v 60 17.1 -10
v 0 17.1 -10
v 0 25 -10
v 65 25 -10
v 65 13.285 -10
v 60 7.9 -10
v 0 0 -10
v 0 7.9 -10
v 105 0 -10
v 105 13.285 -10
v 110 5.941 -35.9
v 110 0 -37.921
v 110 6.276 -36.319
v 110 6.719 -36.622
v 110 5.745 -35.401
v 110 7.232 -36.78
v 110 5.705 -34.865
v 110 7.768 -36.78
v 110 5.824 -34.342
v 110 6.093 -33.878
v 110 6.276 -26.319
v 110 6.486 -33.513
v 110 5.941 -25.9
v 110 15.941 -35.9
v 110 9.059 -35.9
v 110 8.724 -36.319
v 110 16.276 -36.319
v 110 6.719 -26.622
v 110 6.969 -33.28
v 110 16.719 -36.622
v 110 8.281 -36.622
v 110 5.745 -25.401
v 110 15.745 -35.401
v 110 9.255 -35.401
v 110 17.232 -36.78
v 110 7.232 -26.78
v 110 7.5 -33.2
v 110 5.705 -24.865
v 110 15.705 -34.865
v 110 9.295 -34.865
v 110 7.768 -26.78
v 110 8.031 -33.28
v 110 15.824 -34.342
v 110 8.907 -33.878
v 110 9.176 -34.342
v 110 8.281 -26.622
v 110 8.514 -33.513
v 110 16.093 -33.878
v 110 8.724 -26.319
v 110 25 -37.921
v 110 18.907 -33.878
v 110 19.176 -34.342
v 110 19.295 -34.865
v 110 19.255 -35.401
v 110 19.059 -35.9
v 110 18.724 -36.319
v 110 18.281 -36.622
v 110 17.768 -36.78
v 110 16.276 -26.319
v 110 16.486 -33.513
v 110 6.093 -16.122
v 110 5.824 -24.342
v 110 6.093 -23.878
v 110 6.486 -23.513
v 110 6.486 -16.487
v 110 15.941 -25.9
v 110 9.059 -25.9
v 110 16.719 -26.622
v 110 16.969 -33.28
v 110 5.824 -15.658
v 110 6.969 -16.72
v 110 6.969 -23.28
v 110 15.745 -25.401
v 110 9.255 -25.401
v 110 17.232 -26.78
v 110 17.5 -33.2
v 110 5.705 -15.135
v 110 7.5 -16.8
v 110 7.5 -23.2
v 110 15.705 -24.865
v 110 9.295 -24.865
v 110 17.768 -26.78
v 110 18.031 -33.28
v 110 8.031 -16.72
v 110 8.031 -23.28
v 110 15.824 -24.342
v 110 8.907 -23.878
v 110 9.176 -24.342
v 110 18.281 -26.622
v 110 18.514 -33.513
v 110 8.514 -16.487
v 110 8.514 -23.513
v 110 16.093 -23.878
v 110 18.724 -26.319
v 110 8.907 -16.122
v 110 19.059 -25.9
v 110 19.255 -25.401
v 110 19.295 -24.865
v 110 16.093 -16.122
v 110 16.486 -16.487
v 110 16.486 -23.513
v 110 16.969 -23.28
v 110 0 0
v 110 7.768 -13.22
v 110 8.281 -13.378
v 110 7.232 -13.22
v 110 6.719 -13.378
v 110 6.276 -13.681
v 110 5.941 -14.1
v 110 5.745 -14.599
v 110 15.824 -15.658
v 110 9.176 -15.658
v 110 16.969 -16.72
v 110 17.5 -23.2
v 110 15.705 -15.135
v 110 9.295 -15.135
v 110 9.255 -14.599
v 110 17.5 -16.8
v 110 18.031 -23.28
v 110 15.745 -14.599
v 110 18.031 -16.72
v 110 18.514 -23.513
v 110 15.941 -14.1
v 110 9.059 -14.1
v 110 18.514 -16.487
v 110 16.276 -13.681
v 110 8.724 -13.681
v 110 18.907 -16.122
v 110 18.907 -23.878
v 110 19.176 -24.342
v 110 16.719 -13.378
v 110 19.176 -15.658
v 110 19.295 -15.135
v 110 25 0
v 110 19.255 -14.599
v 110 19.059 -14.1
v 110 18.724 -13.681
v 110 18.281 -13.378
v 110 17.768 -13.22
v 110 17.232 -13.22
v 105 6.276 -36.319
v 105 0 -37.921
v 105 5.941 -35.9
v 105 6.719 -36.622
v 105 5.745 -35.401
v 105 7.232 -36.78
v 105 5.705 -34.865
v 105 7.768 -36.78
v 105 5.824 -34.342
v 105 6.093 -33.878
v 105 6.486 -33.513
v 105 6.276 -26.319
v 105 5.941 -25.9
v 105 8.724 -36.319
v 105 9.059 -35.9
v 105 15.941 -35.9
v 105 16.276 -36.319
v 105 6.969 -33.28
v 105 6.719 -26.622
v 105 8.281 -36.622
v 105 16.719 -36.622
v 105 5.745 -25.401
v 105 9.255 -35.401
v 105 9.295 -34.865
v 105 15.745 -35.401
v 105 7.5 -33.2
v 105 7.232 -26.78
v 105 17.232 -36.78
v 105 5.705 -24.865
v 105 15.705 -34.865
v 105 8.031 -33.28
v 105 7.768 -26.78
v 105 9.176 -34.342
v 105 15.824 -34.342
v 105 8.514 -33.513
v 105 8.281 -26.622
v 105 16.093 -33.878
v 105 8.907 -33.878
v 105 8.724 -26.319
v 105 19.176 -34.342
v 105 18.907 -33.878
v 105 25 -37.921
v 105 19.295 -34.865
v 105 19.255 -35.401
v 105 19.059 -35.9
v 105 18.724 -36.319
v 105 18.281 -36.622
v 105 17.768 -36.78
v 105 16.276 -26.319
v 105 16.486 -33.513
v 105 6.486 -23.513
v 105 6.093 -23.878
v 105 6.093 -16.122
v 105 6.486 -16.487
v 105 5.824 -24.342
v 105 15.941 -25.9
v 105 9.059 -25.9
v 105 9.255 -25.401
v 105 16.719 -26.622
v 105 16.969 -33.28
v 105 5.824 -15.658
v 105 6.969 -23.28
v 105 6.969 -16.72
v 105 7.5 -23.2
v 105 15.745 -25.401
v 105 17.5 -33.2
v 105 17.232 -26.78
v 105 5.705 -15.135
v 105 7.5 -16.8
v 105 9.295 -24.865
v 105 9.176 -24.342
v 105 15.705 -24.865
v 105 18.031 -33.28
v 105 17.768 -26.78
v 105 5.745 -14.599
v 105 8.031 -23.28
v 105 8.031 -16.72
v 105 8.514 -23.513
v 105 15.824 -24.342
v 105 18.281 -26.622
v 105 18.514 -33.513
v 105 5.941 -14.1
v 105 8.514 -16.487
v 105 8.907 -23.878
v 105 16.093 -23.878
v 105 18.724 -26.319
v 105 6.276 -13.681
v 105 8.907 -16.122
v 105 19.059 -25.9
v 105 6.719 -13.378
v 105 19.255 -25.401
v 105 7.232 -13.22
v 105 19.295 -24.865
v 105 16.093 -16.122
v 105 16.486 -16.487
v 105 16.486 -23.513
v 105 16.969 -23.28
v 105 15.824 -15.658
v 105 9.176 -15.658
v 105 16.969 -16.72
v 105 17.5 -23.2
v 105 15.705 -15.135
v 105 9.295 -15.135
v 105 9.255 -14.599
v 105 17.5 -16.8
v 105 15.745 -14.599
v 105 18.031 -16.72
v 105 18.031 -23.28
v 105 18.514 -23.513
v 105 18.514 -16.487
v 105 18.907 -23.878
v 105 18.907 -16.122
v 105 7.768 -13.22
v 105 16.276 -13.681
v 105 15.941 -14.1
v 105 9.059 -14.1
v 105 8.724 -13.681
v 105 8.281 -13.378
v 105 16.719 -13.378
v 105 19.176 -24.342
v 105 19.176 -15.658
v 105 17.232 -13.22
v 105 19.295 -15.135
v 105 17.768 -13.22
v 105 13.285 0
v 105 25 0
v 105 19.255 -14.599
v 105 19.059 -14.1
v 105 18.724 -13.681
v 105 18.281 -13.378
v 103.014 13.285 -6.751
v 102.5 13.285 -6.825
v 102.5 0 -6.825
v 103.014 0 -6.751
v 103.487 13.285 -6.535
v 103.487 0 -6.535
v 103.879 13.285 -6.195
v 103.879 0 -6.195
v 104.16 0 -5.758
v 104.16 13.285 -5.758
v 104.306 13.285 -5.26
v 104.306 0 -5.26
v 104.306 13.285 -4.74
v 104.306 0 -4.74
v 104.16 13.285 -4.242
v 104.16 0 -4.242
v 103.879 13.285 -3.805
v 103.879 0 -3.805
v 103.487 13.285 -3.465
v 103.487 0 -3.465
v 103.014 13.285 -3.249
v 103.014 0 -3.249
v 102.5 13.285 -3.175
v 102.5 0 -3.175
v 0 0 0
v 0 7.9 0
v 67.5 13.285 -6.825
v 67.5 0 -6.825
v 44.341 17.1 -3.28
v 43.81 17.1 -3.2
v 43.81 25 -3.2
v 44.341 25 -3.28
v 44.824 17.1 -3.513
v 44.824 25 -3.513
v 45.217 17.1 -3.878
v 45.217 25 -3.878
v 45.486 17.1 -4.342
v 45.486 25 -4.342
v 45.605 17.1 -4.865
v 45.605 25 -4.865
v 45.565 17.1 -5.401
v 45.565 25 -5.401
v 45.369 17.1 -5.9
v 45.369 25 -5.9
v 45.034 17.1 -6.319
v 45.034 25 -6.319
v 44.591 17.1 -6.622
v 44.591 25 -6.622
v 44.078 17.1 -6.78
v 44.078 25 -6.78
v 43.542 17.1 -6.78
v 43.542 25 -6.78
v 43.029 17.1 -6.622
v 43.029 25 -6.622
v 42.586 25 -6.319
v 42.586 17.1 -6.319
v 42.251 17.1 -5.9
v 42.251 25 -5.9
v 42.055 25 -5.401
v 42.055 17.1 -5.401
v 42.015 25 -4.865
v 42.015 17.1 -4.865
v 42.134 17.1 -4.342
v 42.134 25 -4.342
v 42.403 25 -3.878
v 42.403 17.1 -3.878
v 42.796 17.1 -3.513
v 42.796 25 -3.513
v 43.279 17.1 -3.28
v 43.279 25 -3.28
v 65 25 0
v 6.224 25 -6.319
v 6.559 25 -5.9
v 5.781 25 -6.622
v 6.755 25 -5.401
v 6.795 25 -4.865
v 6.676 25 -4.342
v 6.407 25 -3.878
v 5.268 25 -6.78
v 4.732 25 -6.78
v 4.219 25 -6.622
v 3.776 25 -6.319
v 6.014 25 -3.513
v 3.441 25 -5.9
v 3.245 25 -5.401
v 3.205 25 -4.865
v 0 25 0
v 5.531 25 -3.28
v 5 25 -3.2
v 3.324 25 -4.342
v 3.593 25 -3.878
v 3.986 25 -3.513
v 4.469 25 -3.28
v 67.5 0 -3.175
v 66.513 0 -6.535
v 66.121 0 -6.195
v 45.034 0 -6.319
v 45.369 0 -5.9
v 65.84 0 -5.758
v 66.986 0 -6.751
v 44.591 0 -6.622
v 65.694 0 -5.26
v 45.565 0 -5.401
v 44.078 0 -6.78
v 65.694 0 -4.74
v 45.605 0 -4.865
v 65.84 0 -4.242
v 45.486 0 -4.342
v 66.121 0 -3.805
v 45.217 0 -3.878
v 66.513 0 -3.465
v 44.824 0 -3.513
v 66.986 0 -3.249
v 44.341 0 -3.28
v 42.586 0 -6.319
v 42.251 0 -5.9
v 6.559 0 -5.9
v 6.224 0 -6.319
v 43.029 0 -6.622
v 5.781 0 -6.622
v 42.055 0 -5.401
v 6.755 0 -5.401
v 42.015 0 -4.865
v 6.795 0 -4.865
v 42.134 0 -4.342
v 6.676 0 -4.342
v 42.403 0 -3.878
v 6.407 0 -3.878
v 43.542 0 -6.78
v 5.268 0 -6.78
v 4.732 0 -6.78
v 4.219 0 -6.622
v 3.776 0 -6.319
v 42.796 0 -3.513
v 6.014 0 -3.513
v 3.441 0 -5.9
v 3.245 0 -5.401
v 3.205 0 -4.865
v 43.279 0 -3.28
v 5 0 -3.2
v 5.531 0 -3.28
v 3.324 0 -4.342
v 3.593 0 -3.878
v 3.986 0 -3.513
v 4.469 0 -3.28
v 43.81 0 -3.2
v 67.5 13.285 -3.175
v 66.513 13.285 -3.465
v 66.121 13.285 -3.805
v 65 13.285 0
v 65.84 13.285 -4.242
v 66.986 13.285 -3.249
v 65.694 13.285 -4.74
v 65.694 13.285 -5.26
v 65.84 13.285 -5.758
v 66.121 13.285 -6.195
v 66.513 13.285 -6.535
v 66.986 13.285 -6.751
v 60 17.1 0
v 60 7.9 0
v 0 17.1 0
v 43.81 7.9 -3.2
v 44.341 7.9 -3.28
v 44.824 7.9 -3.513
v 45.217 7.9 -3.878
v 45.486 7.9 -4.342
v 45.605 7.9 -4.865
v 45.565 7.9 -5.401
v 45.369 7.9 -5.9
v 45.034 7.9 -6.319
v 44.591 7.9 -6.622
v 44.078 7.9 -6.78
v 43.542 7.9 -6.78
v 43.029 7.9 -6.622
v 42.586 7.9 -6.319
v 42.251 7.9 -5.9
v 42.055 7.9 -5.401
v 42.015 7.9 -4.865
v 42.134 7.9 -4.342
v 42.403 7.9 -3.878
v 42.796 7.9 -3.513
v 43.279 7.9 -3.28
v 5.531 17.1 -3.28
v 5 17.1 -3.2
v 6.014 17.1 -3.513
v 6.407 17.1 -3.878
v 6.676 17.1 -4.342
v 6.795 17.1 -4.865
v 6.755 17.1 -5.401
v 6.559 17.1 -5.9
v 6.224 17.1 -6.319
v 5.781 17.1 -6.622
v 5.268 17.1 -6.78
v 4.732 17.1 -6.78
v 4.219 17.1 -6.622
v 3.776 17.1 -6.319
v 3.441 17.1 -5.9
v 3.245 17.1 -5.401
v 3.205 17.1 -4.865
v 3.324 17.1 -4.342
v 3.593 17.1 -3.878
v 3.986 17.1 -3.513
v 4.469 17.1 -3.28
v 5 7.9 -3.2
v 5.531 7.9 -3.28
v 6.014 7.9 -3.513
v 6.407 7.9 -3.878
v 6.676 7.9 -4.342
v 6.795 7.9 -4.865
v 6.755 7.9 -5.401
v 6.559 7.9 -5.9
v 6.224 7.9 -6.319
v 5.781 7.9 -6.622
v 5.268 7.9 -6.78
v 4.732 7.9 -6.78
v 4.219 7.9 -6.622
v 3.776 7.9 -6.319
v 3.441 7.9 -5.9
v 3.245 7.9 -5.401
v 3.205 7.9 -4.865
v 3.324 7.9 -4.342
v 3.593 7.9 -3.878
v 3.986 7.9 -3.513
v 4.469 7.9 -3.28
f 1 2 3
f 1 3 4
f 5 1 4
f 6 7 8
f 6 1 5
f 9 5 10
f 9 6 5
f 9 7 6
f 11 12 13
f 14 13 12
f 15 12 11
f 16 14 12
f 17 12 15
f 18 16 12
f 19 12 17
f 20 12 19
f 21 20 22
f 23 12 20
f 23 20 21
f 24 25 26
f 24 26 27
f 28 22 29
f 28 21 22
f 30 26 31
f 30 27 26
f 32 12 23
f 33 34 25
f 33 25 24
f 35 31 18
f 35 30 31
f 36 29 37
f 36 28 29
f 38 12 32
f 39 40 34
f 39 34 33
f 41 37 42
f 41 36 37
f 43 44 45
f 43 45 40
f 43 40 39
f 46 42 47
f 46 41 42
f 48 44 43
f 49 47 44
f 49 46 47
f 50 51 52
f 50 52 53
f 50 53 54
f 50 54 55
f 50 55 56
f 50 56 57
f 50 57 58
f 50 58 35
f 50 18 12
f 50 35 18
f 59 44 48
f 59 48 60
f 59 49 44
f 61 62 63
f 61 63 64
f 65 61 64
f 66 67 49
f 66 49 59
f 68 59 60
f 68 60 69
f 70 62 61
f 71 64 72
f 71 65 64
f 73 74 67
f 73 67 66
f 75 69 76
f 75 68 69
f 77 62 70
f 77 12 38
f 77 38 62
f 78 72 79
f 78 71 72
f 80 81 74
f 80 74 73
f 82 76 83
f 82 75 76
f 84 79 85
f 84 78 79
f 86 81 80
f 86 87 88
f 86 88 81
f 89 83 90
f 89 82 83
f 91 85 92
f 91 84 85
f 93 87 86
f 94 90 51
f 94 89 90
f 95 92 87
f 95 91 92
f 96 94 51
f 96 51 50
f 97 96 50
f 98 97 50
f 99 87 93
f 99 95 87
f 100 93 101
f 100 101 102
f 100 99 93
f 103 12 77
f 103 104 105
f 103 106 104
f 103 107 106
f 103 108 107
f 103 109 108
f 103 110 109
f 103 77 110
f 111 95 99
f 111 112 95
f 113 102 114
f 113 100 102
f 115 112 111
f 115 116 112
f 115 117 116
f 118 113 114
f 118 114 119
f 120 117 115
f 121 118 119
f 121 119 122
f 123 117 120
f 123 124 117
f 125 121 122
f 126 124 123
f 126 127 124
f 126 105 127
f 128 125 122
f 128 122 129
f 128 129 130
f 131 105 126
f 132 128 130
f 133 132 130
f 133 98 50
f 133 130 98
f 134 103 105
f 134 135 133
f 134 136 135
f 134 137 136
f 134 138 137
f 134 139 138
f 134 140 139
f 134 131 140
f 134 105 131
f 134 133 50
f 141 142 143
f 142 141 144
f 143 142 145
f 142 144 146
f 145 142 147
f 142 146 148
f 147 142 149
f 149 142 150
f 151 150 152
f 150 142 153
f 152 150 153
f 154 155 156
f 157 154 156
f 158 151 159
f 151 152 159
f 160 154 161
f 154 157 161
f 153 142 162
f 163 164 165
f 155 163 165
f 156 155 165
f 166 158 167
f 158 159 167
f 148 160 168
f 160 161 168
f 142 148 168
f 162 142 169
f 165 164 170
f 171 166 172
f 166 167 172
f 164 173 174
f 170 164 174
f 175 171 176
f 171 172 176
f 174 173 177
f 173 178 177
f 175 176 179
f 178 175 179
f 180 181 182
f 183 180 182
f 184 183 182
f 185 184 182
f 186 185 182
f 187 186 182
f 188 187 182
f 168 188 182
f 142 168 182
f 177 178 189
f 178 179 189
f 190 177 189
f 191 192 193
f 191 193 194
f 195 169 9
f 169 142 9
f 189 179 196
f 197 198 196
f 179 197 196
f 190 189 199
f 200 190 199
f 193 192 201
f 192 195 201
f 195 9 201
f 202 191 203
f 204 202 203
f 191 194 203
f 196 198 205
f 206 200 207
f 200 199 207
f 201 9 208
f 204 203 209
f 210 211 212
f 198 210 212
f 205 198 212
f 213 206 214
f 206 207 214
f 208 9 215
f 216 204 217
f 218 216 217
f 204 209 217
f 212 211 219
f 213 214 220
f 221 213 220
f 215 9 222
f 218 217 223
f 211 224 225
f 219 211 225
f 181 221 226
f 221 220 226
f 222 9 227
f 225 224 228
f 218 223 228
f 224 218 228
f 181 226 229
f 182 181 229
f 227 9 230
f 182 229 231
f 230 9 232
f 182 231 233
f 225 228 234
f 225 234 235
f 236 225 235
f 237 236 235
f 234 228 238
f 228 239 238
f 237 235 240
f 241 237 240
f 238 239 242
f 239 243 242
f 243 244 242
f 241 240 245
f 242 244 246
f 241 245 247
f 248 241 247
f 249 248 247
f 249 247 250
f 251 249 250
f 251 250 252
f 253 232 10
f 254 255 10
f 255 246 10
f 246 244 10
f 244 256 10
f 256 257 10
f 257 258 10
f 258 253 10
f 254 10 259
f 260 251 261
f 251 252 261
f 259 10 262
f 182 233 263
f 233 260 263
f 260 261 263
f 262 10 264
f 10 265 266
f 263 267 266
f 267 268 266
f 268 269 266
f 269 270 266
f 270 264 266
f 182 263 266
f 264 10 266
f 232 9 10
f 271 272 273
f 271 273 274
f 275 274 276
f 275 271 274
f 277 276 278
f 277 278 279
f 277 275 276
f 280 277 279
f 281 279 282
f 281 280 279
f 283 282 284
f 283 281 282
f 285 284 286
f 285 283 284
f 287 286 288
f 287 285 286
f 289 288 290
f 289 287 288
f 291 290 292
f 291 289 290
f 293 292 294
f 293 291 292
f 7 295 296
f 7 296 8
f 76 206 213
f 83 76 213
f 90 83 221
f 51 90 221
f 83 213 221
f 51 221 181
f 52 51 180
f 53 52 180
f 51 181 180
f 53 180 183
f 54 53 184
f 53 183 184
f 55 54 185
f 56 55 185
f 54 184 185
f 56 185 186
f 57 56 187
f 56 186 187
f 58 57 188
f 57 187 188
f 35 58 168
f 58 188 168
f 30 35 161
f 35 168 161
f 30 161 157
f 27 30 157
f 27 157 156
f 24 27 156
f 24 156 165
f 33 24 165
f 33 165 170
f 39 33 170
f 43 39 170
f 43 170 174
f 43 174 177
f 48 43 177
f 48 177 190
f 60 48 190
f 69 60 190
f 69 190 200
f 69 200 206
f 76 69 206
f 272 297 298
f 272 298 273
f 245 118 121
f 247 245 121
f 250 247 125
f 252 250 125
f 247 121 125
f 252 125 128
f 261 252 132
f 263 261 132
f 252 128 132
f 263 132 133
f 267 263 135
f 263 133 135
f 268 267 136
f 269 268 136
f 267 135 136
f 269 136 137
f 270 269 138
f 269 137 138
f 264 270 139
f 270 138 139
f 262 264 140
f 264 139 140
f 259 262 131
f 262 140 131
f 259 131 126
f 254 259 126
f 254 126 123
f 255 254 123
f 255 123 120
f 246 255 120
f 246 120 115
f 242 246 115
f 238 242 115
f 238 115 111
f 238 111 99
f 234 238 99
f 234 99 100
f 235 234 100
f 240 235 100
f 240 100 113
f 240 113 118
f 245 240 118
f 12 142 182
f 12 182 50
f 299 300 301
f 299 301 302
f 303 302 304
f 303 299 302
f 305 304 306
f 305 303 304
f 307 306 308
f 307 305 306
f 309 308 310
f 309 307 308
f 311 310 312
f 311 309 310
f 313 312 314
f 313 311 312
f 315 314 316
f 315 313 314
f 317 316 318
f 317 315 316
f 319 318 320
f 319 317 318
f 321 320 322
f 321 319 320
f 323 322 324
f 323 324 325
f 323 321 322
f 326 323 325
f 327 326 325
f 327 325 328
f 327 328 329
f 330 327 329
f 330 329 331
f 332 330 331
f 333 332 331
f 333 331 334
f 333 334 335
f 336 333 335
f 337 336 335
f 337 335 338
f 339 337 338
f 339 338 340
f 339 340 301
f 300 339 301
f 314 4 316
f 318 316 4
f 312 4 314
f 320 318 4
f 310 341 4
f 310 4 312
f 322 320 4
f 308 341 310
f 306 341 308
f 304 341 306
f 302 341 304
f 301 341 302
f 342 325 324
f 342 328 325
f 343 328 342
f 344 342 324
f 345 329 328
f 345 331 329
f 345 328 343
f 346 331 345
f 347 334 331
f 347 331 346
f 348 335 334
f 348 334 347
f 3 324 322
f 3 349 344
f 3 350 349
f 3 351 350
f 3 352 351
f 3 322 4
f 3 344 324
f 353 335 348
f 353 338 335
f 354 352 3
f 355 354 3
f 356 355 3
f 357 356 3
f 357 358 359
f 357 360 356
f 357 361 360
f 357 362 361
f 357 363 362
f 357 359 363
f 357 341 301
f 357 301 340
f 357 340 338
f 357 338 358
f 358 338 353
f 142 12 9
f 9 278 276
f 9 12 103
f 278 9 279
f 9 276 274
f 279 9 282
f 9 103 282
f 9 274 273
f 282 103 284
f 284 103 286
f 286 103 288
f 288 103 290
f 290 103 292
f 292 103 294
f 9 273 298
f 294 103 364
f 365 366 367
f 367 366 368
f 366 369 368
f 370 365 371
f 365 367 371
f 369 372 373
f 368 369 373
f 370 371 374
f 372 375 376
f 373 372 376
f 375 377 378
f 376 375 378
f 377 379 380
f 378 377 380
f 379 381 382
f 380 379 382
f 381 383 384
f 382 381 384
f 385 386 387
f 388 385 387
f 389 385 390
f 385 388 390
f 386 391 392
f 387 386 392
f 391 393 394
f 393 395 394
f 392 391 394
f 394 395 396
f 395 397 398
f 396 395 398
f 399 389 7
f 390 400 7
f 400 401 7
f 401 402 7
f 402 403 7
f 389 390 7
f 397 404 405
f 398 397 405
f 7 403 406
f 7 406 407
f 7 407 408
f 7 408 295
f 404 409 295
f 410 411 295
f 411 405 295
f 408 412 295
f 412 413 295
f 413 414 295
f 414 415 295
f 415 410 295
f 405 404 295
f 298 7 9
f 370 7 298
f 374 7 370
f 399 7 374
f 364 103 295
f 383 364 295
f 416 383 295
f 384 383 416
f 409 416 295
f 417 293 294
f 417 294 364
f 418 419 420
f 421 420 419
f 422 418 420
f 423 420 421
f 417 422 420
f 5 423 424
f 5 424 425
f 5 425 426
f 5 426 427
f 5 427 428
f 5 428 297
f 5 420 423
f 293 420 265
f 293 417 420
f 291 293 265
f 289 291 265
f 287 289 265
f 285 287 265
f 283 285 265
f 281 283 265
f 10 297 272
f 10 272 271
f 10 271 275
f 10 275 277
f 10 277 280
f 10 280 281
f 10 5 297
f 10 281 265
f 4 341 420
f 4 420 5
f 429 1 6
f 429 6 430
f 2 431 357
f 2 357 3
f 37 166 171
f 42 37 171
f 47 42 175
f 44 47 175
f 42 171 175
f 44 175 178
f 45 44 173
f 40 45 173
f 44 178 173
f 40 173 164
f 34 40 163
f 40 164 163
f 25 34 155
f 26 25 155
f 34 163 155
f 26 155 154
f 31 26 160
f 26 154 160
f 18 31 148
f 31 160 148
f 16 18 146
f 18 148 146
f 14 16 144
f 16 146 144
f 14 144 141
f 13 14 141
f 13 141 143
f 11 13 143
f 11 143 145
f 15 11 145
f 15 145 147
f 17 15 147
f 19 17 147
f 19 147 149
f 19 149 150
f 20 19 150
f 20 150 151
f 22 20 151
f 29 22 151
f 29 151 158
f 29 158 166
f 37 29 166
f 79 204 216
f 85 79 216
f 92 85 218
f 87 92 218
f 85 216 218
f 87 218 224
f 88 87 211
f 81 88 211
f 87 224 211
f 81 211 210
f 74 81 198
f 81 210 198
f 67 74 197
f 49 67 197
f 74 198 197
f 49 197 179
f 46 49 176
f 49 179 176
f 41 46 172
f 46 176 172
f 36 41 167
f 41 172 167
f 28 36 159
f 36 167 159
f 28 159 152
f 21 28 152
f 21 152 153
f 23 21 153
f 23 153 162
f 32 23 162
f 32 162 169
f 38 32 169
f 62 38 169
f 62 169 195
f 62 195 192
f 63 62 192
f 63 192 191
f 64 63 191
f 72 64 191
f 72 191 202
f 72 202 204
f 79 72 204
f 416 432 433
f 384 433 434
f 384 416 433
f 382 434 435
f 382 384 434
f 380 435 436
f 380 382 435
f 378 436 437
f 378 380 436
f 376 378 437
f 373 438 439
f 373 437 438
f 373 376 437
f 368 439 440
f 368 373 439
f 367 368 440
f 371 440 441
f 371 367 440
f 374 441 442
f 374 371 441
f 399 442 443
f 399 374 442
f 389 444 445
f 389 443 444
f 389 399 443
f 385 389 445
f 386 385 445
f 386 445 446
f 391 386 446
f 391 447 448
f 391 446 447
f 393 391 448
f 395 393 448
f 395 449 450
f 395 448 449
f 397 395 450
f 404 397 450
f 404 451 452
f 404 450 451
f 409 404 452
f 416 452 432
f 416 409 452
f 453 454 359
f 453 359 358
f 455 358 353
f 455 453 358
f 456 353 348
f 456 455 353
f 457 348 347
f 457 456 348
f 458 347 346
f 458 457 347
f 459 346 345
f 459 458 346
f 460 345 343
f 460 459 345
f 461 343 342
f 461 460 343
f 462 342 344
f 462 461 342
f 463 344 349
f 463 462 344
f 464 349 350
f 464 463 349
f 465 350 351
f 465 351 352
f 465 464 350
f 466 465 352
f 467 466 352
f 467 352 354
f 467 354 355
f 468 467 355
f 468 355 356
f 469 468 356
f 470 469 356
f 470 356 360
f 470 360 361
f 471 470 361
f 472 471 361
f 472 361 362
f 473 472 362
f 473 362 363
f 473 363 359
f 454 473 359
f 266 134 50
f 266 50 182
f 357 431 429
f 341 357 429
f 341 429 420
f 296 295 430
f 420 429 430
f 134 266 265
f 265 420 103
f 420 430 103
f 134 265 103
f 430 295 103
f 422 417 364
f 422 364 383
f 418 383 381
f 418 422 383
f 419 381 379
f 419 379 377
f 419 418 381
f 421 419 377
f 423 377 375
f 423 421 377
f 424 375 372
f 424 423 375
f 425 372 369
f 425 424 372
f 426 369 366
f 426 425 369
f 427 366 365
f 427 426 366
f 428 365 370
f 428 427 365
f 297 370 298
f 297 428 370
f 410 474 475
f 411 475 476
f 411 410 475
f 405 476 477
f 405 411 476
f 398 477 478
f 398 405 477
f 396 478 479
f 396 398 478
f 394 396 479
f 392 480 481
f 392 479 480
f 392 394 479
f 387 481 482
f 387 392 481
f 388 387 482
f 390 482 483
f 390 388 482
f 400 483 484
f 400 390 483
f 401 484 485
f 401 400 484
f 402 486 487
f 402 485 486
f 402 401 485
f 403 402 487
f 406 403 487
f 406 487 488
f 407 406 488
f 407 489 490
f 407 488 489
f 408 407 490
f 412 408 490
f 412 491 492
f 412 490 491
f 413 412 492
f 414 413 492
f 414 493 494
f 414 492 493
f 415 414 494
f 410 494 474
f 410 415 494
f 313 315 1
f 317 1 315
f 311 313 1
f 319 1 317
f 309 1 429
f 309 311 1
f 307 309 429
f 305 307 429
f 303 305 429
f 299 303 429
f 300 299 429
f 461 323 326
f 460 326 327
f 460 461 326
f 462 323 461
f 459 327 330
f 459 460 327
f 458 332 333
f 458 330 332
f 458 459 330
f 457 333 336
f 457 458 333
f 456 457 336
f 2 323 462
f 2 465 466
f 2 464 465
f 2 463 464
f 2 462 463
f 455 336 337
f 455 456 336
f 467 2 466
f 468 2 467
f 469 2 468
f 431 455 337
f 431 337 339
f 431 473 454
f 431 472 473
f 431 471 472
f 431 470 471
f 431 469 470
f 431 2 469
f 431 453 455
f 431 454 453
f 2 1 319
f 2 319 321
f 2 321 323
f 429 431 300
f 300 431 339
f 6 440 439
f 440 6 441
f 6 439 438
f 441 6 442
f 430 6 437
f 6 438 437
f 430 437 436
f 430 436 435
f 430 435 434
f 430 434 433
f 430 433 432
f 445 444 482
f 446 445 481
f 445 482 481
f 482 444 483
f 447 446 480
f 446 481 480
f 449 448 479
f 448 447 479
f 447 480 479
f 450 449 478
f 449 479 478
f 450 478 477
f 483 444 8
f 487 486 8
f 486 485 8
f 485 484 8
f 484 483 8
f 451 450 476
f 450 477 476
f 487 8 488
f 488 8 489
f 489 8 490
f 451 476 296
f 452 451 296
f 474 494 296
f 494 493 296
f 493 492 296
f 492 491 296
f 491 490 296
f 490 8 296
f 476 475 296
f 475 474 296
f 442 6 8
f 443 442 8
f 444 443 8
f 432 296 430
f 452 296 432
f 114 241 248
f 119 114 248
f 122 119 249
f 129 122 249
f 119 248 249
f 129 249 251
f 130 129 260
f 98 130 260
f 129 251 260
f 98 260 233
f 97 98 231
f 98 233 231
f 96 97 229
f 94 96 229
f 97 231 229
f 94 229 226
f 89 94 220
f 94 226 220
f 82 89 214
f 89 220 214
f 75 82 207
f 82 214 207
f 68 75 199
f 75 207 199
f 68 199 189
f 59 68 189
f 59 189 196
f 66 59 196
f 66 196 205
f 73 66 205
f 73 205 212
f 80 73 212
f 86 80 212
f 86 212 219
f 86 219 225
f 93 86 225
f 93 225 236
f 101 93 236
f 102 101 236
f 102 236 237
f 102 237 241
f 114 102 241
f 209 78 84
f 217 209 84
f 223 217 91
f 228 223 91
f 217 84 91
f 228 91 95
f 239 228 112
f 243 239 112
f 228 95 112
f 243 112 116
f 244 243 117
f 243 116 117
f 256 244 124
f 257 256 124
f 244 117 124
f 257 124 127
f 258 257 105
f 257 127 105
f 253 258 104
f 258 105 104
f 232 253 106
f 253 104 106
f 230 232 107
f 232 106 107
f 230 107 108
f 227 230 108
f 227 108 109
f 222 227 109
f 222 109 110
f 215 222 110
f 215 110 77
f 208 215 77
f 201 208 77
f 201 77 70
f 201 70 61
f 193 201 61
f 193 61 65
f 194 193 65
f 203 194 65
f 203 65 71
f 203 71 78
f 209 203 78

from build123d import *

# Parameters (mm, degrees)
SKETCH1_W           = 110
SKETCH1_H           = 10
SKETCH1_R           = 1.8
BOSS_EXTRUDE1_DEPTH = 25
SKETCH2_W           = 10
SKETCH2_H           = 9.2
CUT_EXTRUDE1_DEPTH  = 60
SKETCH16_W          = 5
SKETCH16_H          = 25
BOSS_EXTRUDE2_DEPTH = 10
SKETCH17_R          = 1.8
CUT_EXTRUDE6_DEPTH  = 10
SKETCH18_W          = 5
SKETCH18_H          = 25
BOSS_EXTRUDE3_DEPTH = 20
SKETCH19_R          = 1.8
CUT_EXTRUDE7_DEPTH  = 12
SKETCH20_W          = 5
SKETCH20_H          = 2.078520269
CUT_EXTRUDE8_DEPTH  = 46
SKETCH21_W          = 40
SKETCH21_H          = 10
CUT_EXTRUDE9_DEPTH  = 11.715
CUT_EXTRUDE10_DEPTH = 13.285


with BuildPart() as part:
    # Sketch1 → Boss-Extrude1 (new body)
    with BuildSketch(Plane(origin=(0, 0, 0), x_dir=(1, 0, 0), z_dir=(0, 1, 0))):
        with Locations((55, 5)):
            Rectangle(SKETCH1_W, SKETCH1_H)
        with Locations(Location((5, 5, 0), (0, 0, 270))):
            Circle(SKETCH1_R, mode=Mode.SUBTRACT)
        with Locations(Location((43.81, 5, 0), (0, 0, 270))):
            Circle(SKETCH1_R, mode=Mode.SUBTRACT)
    extrude(amount=BOSS_EXTRUDE1_DEPTH)

    # Sketch2 → Cut-Extrude1 (cut)
    with BuildSketch(Plane.ZY):
        with Locations((-5, 12.5)):
            Rectangle(SKETCH2_W, SKETCH2_H)
    extrude(amount=-CUT_EXTRUDE1_DEPTH, mode=Mode.SUBTRACT)

    # Sketch16 → Boss-Extrude2 (add)
    with BuildSketch(Plane(origin=(0, 0, -10), x_dir=(-1, 0, 0), z_dir=(0, 0, -1))):
        with Locations((-107.5, 12.5)):
            Rectangle(SKETCH16_W, SKETCH16_H)
    extrude(amount=BOSS_EXTRUDE2_DEPTH)

    # Sketch17 → Cut-Extrude6 (cut)
    with BuildSketch(Plane(origin=(110, 0, 0), x_dir=(0, 0, -1), z_dir=(1, 0, 0))):
        with Locations((15, 7.5)):
            Circle(SKETCH17_R)
        with Locations((15, 17.5)):
            Circle(SKETCH17_R)
    extrude(amount=-CUT_EXTRUDE6_DEPTH, mode=Mode.SUBTRACT)

    # Sketch18 → Boss-Extrude3 (add)
    with BuildSketch(Plane(origin=(0, 0, -20), x_dir=(-1, 0, 0), z_dir=(0, 0, -1))):
        with Locations((-107.5, 12.5)):
            Rectangle(SKETCH18_W, SKETCH18_H)
    extrude(amount=BOSS_EXTRUDE3_DEPTH)

    # Sketch19 → Cut-Extrude7 (cut)
    with BuildSketch(Plane.ZY.offset(-105)):
        with Locations((-25, 17.5)):
            Circle(SKETCH19_R)
        with Locations((-25, 7.5)):
            Circle(SKETCH19_R)
        with Locations((-35, 17.5)):
            Circle(SKETCH19_R)
        with Locations((-35, 7.5)):
            Circle(SKETCH19_R)
    extrude(amount=-CUT_EXTRUDE7_DEPTH, mode=Mode.SUBTRACT)

    # Sketch20 → Cut-Extrude8 (cut)
    with BuildSketch(Plane.XZ):
        with Locations((107.5, -38.960739866)):
            Rectangle(SKETCH20_W, SKETCH20_H)
    extrude(amount=-CUT_EXTRUDE8_DEPTH, mode=Mode.SUBTRACT)

    # Sketch21 → Cut-Extrude9 (cut)
    with BuildSketch(Plane(origin=(0, 25, 0), x_dir=(1, 0, 0), z_dir=(0, 1, 0))):
        with Locations((85, 5)):
            Rectangle(SKETCH21_W, SKETCH21_H)
    extrude(amount=-CUT_EXTRUDE9_DEPTH, mode=Mode.SUBTRACT)

    # Sketch23 → Cut-Extrude10 (cut)
    with BuildSketch(Plane(origin=(0, 13.285, 0), x_dir=(1, 0, 0), z_dir=(0, 1, 0))):
        with BuildLine():
            Line((67.5, 6.825), (102.5, 6.825))
            ThreePointArc((102.5, 6.825), (104.325, 5), (102.5, 3.175))
            Line((102.5, 3.175), (67.5, 3.175))
            ThreePointArc((67.5, 3.175), (65.675, 5), (67.5, 6.825))
        make_face()
    extrude(amount=-CUT_EXTRUDE10_DEPTH, mode=Mode.SUBTRACT)


solid = part.part
